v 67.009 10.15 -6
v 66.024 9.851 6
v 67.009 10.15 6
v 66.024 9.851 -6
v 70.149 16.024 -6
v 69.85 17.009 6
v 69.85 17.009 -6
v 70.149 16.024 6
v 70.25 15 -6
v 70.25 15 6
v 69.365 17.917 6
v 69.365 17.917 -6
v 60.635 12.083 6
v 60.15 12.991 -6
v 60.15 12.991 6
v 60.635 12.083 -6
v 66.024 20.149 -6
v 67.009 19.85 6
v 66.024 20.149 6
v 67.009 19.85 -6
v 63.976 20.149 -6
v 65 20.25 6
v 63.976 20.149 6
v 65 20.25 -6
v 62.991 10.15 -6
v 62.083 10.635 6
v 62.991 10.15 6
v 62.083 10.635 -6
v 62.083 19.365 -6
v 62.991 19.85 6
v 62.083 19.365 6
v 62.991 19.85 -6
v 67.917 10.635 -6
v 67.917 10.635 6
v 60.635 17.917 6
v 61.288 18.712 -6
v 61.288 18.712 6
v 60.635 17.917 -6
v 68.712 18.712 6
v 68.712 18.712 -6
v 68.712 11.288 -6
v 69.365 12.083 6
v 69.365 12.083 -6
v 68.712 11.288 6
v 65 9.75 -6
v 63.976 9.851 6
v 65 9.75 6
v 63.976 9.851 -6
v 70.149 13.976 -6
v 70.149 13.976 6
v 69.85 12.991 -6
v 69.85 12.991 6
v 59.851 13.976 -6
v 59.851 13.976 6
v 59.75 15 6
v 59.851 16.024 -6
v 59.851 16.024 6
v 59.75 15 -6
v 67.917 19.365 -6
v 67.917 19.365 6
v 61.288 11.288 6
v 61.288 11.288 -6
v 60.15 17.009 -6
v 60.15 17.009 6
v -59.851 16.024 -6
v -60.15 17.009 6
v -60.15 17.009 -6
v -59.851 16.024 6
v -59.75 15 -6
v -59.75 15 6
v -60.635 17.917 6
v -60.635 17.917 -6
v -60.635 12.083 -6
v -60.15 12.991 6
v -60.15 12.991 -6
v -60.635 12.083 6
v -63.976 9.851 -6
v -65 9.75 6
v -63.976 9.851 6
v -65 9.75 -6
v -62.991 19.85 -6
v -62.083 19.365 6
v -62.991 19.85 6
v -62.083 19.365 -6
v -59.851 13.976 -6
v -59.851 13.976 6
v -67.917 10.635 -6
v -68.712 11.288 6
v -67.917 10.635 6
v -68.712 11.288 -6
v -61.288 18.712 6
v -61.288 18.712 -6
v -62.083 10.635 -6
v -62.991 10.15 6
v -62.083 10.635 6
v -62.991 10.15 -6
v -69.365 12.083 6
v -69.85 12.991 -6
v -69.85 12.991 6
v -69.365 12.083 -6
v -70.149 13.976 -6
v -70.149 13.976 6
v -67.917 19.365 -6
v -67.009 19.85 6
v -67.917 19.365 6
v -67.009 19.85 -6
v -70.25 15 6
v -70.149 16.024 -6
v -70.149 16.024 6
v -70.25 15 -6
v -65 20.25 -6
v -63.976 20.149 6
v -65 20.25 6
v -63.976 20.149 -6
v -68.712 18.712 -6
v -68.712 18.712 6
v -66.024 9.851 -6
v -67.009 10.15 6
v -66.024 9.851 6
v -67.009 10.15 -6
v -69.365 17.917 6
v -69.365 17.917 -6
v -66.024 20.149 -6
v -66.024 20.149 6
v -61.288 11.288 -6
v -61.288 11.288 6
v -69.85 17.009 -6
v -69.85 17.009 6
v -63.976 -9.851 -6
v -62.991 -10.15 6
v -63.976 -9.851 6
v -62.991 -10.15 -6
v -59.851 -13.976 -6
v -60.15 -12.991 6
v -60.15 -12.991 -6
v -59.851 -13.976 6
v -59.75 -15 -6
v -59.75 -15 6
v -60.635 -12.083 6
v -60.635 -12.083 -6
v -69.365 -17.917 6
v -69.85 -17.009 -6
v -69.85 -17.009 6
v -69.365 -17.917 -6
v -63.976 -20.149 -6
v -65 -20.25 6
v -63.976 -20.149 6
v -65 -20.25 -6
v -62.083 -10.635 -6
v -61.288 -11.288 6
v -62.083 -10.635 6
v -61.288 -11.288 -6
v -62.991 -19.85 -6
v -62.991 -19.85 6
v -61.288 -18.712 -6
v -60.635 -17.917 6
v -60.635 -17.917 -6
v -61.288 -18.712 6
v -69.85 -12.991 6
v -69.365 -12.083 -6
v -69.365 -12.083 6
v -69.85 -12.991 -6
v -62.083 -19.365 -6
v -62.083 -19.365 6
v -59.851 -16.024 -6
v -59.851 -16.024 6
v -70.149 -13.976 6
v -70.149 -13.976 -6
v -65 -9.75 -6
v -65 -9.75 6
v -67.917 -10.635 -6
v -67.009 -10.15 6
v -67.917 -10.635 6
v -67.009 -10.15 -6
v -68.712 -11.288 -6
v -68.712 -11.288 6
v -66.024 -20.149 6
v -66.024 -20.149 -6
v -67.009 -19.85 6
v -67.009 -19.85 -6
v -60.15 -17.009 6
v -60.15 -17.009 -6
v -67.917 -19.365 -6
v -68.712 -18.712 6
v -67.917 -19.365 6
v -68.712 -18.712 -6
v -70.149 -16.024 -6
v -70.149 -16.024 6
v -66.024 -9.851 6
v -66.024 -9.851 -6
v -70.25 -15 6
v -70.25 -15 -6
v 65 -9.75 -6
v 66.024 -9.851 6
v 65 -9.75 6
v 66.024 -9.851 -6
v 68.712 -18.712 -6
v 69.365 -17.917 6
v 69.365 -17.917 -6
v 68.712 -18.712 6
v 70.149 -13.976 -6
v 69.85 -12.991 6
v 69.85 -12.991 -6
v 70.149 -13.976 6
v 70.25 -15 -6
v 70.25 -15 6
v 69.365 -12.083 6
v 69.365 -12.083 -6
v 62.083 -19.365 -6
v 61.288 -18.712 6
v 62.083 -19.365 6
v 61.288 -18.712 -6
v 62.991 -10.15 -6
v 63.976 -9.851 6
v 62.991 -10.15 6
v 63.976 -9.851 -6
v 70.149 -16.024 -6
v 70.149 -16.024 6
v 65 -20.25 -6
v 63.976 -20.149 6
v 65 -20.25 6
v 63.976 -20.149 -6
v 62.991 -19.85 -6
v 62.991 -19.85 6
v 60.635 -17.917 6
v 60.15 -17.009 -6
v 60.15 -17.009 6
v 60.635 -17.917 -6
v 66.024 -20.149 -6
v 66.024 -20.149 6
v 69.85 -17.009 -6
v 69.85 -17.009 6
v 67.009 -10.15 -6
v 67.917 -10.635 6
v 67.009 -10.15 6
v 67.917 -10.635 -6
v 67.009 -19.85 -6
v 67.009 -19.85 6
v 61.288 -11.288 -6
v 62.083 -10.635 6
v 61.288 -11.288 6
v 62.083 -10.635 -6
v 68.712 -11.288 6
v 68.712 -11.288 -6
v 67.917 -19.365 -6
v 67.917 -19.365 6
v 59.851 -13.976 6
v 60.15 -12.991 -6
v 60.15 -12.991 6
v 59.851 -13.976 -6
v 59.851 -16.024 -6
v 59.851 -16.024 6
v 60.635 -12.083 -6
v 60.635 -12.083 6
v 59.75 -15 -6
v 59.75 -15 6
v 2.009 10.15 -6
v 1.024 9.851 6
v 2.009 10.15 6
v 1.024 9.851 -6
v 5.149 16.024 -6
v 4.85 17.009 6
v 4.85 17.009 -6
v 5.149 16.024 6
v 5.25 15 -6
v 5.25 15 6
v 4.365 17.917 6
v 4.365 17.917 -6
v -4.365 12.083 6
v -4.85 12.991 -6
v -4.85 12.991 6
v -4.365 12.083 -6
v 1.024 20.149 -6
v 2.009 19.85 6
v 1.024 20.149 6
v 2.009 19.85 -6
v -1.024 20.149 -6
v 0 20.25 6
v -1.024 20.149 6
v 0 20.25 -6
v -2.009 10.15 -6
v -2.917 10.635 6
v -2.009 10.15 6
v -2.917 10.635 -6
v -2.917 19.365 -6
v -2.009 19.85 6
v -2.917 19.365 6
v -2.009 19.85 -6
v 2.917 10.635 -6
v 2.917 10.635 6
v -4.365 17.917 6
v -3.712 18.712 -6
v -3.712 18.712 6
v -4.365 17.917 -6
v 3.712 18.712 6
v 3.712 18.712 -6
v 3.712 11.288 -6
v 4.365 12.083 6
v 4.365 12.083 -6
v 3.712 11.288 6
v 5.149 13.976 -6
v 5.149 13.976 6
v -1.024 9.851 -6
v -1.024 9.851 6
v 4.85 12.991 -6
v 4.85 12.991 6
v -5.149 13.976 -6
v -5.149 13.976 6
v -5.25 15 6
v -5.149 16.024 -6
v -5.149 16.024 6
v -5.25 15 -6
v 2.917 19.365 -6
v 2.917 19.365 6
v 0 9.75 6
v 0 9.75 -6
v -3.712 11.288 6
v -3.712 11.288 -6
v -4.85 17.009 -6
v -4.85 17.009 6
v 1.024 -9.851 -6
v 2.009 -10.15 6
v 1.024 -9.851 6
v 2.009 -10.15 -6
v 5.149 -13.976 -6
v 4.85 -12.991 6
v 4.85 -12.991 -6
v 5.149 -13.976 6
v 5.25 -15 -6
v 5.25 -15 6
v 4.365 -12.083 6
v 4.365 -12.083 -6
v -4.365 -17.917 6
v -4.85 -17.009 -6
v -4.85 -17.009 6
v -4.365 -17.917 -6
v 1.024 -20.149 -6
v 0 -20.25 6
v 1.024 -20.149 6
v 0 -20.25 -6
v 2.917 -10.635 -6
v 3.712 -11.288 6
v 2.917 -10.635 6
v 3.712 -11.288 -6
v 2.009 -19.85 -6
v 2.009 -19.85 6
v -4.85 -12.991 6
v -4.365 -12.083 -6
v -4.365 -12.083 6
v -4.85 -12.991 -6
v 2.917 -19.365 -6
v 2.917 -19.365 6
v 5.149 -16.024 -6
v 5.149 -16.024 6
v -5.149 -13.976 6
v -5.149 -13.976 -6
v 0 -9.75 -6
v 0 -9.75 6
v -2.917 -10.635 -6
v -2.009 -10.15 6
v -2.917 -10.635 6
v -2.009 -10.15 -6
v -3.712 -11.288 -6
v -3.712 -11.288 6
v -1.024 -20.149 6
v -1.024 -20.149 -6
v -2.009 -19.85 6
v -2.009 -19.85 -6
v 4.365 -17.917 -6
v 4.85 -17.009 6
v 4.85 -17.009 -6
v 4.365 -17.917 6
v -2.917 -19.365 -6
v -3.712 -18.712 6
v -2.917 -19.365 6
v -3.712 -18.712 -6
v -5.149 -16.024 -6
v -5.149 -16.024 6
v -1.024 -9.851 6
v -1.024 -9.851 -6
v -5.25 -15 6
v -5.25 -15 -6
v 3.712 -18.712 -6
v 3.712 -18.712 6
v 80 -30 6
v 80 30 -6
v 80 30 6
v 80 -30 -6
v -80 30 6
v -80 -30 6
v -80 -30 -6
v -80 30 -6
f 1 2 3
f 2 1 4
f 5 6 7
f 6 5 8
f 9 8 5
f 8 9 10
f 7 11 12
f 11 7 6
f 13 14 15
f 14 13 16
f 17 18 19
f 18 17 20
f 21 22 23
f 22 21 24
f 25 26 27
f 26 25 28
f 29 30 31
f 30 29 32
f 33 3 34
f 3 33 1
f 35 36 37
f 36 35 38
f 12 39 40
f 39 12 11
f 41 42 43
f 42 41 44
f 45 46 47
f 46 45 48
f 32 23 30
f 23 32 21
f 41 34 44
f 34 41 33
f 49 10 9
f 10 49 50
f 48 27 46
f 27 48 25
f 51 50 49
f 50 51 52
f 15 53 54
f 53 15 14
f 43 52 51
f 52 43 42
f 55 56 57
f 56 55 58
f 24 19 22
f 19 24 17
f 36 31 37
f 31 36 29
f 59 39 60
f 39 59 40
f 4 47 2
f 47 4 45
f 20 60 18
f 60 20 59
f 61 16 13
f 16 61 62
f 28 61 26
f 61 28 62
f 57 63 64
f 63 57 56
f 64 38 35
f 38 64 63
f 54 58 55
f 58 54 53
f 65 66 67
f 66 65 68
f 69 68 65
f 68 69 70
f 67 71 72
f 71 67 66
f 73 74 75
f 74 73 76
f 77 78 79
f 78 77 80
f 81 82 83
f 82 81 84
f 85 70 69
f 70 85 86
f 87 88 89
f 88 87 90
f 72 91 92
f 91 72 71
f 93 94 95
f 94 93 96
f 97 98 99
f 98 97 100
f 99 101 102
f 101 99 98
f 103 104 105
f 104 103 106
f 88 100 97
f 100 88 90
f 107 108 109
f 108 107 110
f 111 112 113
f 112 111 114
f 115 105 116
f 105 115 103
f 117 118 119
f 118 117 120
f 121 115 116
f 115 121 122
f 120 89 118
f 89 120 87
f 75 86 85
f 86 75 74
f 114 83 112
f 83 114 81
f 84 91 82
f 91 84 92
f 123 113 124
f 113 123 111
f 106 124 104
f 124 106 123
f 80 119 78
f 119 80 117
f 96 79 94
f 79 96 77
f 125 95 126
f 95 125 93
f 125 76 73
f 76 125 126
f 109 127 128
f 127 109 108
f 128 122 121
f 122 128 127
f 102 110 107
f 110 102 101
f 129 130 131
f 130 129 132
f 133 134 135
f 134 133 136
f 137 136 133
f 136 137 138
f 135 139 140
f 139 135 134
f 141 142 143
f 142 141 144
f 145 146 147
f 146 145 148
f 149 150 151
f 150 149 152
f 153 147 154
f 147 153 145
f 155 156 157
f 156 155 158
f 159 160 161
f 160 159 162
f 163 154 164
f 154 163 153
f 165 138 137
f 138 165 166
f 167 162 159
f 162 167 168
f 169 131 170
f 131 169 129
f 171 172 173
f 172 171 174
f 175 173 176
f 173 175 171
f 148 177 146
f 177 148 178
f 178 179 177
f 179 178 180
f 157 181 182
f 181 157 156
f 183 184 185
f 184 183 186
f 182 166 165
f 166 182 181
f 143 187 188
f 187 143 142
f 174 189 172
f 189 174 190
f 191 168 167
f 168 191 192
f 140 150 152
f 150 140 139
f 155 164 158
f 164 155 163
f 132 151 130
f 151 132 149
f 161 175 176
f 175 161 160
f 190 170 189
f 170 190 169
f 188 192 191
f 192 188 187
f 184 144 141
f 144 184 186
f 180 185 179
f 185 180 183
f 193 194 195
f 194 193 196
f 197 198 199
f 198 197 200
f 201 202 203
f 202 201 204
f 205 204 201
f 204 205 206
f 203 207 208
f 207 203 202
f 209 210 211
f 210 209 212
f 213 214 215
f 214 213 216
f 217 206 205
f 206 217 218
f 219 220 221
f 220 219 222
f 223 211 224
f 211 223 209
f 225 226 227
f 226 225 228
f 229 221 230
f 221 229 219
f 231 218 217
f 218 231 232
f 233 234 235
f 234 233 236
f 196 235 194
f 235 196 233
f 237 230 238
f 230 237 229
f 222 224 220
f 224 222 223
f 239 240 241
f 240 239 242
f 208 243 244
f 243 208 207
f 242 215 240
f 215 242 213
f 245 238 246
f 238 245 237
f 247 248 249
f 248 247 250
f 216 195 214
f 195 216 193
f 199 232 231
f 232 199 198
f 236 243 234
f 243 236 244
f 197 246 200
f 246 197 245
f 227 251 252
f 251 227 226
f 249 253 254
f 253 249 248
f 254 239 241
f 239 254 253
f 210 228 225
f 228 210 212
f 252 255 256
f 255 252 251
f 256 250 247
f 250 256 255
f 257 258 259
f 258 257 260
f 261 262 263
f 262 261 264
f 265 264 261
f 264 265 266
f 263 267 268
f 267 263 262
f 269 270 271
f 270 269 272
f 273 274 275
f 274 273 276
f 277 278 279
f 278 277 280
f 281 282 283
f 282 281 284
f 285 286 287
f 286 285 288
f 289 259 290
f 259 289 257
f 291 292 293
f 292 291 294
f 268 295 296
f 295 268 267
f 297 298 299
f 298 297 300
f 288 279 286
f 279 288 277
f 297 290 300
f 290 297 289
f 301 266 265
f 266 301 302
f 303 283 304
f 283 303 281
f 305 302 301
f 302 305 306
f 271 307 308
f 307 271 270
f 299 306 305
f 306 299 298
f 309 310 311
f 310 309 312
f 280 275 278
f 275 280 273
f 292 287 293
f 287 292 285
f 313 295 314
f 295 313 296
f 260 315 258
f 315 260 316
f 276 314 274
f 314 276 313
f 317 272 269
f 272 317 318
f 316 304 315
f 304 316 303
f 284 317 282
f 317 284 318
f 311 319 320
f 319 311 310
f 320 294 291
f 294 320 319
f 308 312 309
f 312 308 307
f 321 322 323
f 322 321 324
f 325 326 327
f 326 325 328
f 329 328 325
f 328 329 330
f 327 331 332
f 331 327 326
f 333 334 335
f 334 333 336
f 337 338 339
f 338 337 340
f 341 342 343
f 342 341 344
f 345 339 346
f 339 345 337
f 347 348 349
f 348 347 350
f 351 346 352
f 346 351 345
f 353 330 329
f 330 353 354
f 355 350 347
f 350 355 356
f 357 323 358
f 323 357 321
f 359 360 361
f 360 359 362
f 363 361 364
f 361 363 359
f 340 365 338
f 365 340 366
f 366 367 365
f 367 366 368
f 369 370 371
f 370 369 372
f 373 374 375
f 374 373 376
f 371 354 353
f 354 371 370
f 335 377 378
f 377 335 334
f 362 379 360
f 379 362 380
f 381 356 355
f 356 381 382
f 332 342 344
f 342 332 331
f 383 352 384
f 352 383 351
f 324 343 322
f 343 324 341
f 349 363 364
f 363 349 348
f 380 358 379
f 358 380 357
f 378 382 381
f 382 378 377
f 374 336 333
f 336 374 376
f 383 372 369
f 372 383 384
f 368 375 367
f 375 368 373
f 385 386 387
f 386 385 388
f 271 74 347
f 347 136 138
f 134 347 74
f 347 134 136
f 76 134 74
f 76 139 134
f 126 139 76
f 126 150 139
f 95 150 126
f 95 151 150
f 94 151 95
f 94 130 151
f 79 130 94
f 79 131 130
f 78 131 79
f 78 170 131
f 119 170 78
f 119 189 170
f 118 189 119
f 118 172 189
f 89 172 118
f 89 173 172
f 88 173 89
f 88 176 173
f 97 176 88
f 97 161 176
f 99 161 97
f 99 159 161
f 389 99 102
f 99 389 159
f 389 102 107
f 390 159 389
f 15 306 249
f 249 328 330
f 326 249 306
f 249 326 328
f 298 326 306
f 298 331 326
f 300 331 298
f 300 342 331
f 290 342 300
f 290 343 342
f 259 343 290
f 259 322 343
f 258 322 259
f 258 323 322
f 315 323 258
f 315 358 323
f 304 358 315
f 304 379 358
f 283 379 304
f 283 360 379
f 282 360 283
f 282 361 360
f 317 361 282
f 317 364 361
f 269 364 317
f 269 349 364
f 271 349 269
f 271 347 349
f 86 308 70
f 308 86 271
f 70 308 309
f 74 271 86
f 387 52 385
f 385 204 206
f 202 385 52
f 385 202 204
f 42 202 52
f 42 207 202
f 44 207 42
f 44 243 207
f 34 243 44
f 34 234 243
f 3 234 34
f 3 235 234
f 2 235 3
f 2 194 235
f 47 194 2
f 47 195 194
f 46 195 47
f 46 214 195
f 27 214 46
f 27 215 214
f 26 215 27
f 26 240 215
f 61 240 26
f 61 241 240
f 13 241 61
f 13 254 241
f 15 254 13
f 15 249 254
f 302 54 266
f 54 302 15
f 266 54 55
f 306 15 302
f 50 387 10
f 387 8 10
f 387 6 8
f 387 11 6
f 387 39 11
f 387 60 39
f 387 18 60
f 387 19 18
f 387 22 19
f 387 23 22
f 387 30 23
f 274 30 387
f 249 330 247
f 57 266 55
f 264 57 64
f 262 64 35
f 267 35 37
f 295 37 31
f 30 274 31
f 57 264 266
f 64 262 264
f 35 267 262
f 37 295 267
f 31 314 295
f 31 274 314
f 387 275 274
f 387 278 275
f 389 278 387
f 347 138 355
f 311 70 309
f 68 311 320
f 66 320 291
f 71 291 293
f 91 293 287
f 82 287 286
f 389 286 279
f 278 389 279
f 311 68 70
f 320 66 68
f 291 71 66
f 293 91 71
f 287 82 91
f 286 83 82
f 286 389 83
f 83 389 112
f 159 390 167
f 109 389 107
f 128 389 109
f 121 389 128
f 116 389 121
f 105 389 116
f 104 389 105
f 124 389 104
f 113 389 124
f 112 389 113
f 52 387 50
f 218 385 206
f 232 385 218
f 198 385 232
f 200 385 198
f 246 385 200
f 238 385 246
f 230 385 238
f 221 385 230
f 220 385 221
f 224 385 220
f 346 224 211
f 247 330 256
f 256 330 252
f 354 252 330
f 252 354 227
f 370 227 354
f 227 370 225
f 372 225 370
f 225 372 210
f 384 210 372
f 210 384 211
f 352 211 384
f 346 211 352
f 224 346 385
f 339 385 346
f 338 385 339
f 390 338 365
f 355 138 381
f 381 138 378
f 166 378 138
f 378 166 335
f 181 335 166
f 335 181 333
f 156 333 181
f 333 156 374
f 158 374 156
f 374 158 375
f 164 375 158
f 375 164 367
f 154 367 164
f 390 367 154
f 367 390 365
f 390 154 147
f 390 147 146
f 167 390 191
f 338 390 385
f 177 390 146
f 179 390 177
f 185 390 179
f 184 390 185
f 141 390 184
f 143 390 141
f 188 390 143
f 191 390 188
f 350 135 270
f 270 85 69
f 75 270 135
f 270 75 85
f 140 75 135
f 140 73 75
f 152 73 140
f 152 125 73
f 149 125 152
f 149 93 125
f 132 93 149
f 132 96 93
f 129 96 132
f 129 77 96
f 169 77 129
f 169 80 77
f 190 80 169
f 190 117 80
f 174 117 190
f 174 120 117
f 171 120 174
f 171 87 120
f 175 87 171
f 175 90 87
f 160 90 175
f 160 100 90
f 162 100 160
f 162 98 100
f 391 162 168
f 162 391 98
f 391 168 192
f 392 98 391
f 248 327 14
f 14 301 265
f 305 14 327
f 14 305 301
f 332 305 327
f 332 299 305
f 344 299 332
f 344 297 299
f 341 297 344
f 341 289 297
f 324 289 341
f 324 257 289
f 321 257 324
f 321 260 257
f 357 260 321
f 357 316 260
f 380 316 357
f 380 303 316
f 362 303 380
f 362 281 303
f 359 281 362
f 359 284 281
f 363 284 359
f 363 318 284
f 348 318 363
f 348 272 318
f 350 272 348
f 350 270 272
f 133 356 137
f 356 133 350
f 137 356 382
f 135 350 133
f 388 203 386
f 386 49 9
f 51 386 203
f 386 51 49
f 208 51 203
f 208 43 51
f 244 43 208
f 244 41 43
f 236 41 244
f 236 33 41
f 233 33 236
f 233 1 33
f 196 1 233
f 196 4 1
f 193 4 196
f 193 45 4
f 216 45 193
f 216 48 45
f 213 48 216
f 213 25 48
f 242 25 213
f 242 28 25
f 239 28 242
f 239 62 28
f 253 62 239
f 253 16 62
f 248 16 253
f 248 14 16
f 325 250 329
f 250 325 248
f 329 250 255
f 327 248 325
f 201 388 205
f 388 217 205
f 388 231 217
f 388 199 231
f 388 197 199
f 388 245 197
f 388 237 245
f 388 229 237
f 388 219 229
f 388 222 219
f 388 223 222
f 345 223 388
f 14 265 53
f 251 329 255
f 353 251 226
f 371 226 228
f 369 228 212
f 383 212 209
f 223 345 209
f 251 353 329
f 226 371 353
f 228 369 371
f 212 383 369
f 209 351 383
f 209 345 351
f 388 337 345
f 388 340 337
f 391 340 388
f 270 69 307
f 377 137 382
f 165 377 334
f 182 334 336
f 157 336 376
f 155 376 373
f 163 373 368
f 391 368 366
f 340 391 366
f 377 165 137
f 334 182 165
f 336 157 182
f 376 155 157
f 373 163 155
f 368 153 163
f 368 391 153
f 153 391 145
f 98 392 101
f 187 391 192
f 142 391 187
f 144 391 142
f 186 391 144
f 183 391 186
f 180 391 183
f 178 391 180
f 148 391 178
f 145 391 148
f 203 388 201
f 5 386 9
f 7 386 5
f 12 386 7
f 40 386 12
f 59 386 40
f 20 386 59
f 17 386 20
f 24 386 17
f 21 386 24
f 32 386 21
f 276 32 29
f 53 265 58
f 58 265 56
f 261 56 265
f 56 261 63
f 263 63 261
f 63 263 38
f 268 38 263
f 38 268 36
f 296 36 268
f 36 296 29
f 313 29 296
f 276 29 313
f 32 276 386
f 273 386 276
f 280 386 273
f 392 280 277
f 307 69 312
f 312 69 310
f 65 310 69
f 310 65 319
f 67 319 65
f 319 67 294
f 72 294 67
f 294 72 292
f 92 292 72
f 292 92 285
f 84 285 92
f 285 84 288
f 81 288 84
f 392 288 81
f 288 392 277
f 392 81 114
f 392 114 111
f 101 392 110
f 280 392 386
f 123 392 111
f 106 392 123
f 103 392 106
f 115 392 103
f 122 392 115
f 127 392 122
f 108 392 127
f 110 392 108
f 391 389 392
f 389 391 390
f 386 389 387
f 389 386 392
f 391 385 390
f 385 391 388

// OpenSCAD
$fn = 32;

// ----------------------------------------------------------------------
// Corner plate 160 x 60 x 12
// 6 holes, centres taken from the edge offset
// ----------------------------------------------------------------------

// --- parameters (mm) ---
plate = [160, 60, 12];  // overall size (x, y, z)
holes = 6;              // number of holes the drawing asks for
hole_d = 10.5;          // hole diameter
edge = 15;              // hole centre offset from the plate edge

// --- derived feature positions (mm) ---
corner_x = plate[0] / 2 - edge;  // = 65   corner hole X
corner_y = plate[1] / 2 - edge;  // = 15   corner hole Y
feature_centers = [
  [corner_x, corner_y],
  [-corner_x, corner_y],
  [-corner_x, -corner_y],
  [corner_x, -corner_y],
  [0, corner_y],
  [0, -corner_y]
];   // hole centres the loop below drills

// plate outline, every hole drilled through with the same cutters
difference() {
  cube(plate, center = true);
  for (centre = feature_centers)
    translate([centre[0], centre[1], 0])
      cylinder(d = hole_d, h = plate[2] + 2, center = true);
}
